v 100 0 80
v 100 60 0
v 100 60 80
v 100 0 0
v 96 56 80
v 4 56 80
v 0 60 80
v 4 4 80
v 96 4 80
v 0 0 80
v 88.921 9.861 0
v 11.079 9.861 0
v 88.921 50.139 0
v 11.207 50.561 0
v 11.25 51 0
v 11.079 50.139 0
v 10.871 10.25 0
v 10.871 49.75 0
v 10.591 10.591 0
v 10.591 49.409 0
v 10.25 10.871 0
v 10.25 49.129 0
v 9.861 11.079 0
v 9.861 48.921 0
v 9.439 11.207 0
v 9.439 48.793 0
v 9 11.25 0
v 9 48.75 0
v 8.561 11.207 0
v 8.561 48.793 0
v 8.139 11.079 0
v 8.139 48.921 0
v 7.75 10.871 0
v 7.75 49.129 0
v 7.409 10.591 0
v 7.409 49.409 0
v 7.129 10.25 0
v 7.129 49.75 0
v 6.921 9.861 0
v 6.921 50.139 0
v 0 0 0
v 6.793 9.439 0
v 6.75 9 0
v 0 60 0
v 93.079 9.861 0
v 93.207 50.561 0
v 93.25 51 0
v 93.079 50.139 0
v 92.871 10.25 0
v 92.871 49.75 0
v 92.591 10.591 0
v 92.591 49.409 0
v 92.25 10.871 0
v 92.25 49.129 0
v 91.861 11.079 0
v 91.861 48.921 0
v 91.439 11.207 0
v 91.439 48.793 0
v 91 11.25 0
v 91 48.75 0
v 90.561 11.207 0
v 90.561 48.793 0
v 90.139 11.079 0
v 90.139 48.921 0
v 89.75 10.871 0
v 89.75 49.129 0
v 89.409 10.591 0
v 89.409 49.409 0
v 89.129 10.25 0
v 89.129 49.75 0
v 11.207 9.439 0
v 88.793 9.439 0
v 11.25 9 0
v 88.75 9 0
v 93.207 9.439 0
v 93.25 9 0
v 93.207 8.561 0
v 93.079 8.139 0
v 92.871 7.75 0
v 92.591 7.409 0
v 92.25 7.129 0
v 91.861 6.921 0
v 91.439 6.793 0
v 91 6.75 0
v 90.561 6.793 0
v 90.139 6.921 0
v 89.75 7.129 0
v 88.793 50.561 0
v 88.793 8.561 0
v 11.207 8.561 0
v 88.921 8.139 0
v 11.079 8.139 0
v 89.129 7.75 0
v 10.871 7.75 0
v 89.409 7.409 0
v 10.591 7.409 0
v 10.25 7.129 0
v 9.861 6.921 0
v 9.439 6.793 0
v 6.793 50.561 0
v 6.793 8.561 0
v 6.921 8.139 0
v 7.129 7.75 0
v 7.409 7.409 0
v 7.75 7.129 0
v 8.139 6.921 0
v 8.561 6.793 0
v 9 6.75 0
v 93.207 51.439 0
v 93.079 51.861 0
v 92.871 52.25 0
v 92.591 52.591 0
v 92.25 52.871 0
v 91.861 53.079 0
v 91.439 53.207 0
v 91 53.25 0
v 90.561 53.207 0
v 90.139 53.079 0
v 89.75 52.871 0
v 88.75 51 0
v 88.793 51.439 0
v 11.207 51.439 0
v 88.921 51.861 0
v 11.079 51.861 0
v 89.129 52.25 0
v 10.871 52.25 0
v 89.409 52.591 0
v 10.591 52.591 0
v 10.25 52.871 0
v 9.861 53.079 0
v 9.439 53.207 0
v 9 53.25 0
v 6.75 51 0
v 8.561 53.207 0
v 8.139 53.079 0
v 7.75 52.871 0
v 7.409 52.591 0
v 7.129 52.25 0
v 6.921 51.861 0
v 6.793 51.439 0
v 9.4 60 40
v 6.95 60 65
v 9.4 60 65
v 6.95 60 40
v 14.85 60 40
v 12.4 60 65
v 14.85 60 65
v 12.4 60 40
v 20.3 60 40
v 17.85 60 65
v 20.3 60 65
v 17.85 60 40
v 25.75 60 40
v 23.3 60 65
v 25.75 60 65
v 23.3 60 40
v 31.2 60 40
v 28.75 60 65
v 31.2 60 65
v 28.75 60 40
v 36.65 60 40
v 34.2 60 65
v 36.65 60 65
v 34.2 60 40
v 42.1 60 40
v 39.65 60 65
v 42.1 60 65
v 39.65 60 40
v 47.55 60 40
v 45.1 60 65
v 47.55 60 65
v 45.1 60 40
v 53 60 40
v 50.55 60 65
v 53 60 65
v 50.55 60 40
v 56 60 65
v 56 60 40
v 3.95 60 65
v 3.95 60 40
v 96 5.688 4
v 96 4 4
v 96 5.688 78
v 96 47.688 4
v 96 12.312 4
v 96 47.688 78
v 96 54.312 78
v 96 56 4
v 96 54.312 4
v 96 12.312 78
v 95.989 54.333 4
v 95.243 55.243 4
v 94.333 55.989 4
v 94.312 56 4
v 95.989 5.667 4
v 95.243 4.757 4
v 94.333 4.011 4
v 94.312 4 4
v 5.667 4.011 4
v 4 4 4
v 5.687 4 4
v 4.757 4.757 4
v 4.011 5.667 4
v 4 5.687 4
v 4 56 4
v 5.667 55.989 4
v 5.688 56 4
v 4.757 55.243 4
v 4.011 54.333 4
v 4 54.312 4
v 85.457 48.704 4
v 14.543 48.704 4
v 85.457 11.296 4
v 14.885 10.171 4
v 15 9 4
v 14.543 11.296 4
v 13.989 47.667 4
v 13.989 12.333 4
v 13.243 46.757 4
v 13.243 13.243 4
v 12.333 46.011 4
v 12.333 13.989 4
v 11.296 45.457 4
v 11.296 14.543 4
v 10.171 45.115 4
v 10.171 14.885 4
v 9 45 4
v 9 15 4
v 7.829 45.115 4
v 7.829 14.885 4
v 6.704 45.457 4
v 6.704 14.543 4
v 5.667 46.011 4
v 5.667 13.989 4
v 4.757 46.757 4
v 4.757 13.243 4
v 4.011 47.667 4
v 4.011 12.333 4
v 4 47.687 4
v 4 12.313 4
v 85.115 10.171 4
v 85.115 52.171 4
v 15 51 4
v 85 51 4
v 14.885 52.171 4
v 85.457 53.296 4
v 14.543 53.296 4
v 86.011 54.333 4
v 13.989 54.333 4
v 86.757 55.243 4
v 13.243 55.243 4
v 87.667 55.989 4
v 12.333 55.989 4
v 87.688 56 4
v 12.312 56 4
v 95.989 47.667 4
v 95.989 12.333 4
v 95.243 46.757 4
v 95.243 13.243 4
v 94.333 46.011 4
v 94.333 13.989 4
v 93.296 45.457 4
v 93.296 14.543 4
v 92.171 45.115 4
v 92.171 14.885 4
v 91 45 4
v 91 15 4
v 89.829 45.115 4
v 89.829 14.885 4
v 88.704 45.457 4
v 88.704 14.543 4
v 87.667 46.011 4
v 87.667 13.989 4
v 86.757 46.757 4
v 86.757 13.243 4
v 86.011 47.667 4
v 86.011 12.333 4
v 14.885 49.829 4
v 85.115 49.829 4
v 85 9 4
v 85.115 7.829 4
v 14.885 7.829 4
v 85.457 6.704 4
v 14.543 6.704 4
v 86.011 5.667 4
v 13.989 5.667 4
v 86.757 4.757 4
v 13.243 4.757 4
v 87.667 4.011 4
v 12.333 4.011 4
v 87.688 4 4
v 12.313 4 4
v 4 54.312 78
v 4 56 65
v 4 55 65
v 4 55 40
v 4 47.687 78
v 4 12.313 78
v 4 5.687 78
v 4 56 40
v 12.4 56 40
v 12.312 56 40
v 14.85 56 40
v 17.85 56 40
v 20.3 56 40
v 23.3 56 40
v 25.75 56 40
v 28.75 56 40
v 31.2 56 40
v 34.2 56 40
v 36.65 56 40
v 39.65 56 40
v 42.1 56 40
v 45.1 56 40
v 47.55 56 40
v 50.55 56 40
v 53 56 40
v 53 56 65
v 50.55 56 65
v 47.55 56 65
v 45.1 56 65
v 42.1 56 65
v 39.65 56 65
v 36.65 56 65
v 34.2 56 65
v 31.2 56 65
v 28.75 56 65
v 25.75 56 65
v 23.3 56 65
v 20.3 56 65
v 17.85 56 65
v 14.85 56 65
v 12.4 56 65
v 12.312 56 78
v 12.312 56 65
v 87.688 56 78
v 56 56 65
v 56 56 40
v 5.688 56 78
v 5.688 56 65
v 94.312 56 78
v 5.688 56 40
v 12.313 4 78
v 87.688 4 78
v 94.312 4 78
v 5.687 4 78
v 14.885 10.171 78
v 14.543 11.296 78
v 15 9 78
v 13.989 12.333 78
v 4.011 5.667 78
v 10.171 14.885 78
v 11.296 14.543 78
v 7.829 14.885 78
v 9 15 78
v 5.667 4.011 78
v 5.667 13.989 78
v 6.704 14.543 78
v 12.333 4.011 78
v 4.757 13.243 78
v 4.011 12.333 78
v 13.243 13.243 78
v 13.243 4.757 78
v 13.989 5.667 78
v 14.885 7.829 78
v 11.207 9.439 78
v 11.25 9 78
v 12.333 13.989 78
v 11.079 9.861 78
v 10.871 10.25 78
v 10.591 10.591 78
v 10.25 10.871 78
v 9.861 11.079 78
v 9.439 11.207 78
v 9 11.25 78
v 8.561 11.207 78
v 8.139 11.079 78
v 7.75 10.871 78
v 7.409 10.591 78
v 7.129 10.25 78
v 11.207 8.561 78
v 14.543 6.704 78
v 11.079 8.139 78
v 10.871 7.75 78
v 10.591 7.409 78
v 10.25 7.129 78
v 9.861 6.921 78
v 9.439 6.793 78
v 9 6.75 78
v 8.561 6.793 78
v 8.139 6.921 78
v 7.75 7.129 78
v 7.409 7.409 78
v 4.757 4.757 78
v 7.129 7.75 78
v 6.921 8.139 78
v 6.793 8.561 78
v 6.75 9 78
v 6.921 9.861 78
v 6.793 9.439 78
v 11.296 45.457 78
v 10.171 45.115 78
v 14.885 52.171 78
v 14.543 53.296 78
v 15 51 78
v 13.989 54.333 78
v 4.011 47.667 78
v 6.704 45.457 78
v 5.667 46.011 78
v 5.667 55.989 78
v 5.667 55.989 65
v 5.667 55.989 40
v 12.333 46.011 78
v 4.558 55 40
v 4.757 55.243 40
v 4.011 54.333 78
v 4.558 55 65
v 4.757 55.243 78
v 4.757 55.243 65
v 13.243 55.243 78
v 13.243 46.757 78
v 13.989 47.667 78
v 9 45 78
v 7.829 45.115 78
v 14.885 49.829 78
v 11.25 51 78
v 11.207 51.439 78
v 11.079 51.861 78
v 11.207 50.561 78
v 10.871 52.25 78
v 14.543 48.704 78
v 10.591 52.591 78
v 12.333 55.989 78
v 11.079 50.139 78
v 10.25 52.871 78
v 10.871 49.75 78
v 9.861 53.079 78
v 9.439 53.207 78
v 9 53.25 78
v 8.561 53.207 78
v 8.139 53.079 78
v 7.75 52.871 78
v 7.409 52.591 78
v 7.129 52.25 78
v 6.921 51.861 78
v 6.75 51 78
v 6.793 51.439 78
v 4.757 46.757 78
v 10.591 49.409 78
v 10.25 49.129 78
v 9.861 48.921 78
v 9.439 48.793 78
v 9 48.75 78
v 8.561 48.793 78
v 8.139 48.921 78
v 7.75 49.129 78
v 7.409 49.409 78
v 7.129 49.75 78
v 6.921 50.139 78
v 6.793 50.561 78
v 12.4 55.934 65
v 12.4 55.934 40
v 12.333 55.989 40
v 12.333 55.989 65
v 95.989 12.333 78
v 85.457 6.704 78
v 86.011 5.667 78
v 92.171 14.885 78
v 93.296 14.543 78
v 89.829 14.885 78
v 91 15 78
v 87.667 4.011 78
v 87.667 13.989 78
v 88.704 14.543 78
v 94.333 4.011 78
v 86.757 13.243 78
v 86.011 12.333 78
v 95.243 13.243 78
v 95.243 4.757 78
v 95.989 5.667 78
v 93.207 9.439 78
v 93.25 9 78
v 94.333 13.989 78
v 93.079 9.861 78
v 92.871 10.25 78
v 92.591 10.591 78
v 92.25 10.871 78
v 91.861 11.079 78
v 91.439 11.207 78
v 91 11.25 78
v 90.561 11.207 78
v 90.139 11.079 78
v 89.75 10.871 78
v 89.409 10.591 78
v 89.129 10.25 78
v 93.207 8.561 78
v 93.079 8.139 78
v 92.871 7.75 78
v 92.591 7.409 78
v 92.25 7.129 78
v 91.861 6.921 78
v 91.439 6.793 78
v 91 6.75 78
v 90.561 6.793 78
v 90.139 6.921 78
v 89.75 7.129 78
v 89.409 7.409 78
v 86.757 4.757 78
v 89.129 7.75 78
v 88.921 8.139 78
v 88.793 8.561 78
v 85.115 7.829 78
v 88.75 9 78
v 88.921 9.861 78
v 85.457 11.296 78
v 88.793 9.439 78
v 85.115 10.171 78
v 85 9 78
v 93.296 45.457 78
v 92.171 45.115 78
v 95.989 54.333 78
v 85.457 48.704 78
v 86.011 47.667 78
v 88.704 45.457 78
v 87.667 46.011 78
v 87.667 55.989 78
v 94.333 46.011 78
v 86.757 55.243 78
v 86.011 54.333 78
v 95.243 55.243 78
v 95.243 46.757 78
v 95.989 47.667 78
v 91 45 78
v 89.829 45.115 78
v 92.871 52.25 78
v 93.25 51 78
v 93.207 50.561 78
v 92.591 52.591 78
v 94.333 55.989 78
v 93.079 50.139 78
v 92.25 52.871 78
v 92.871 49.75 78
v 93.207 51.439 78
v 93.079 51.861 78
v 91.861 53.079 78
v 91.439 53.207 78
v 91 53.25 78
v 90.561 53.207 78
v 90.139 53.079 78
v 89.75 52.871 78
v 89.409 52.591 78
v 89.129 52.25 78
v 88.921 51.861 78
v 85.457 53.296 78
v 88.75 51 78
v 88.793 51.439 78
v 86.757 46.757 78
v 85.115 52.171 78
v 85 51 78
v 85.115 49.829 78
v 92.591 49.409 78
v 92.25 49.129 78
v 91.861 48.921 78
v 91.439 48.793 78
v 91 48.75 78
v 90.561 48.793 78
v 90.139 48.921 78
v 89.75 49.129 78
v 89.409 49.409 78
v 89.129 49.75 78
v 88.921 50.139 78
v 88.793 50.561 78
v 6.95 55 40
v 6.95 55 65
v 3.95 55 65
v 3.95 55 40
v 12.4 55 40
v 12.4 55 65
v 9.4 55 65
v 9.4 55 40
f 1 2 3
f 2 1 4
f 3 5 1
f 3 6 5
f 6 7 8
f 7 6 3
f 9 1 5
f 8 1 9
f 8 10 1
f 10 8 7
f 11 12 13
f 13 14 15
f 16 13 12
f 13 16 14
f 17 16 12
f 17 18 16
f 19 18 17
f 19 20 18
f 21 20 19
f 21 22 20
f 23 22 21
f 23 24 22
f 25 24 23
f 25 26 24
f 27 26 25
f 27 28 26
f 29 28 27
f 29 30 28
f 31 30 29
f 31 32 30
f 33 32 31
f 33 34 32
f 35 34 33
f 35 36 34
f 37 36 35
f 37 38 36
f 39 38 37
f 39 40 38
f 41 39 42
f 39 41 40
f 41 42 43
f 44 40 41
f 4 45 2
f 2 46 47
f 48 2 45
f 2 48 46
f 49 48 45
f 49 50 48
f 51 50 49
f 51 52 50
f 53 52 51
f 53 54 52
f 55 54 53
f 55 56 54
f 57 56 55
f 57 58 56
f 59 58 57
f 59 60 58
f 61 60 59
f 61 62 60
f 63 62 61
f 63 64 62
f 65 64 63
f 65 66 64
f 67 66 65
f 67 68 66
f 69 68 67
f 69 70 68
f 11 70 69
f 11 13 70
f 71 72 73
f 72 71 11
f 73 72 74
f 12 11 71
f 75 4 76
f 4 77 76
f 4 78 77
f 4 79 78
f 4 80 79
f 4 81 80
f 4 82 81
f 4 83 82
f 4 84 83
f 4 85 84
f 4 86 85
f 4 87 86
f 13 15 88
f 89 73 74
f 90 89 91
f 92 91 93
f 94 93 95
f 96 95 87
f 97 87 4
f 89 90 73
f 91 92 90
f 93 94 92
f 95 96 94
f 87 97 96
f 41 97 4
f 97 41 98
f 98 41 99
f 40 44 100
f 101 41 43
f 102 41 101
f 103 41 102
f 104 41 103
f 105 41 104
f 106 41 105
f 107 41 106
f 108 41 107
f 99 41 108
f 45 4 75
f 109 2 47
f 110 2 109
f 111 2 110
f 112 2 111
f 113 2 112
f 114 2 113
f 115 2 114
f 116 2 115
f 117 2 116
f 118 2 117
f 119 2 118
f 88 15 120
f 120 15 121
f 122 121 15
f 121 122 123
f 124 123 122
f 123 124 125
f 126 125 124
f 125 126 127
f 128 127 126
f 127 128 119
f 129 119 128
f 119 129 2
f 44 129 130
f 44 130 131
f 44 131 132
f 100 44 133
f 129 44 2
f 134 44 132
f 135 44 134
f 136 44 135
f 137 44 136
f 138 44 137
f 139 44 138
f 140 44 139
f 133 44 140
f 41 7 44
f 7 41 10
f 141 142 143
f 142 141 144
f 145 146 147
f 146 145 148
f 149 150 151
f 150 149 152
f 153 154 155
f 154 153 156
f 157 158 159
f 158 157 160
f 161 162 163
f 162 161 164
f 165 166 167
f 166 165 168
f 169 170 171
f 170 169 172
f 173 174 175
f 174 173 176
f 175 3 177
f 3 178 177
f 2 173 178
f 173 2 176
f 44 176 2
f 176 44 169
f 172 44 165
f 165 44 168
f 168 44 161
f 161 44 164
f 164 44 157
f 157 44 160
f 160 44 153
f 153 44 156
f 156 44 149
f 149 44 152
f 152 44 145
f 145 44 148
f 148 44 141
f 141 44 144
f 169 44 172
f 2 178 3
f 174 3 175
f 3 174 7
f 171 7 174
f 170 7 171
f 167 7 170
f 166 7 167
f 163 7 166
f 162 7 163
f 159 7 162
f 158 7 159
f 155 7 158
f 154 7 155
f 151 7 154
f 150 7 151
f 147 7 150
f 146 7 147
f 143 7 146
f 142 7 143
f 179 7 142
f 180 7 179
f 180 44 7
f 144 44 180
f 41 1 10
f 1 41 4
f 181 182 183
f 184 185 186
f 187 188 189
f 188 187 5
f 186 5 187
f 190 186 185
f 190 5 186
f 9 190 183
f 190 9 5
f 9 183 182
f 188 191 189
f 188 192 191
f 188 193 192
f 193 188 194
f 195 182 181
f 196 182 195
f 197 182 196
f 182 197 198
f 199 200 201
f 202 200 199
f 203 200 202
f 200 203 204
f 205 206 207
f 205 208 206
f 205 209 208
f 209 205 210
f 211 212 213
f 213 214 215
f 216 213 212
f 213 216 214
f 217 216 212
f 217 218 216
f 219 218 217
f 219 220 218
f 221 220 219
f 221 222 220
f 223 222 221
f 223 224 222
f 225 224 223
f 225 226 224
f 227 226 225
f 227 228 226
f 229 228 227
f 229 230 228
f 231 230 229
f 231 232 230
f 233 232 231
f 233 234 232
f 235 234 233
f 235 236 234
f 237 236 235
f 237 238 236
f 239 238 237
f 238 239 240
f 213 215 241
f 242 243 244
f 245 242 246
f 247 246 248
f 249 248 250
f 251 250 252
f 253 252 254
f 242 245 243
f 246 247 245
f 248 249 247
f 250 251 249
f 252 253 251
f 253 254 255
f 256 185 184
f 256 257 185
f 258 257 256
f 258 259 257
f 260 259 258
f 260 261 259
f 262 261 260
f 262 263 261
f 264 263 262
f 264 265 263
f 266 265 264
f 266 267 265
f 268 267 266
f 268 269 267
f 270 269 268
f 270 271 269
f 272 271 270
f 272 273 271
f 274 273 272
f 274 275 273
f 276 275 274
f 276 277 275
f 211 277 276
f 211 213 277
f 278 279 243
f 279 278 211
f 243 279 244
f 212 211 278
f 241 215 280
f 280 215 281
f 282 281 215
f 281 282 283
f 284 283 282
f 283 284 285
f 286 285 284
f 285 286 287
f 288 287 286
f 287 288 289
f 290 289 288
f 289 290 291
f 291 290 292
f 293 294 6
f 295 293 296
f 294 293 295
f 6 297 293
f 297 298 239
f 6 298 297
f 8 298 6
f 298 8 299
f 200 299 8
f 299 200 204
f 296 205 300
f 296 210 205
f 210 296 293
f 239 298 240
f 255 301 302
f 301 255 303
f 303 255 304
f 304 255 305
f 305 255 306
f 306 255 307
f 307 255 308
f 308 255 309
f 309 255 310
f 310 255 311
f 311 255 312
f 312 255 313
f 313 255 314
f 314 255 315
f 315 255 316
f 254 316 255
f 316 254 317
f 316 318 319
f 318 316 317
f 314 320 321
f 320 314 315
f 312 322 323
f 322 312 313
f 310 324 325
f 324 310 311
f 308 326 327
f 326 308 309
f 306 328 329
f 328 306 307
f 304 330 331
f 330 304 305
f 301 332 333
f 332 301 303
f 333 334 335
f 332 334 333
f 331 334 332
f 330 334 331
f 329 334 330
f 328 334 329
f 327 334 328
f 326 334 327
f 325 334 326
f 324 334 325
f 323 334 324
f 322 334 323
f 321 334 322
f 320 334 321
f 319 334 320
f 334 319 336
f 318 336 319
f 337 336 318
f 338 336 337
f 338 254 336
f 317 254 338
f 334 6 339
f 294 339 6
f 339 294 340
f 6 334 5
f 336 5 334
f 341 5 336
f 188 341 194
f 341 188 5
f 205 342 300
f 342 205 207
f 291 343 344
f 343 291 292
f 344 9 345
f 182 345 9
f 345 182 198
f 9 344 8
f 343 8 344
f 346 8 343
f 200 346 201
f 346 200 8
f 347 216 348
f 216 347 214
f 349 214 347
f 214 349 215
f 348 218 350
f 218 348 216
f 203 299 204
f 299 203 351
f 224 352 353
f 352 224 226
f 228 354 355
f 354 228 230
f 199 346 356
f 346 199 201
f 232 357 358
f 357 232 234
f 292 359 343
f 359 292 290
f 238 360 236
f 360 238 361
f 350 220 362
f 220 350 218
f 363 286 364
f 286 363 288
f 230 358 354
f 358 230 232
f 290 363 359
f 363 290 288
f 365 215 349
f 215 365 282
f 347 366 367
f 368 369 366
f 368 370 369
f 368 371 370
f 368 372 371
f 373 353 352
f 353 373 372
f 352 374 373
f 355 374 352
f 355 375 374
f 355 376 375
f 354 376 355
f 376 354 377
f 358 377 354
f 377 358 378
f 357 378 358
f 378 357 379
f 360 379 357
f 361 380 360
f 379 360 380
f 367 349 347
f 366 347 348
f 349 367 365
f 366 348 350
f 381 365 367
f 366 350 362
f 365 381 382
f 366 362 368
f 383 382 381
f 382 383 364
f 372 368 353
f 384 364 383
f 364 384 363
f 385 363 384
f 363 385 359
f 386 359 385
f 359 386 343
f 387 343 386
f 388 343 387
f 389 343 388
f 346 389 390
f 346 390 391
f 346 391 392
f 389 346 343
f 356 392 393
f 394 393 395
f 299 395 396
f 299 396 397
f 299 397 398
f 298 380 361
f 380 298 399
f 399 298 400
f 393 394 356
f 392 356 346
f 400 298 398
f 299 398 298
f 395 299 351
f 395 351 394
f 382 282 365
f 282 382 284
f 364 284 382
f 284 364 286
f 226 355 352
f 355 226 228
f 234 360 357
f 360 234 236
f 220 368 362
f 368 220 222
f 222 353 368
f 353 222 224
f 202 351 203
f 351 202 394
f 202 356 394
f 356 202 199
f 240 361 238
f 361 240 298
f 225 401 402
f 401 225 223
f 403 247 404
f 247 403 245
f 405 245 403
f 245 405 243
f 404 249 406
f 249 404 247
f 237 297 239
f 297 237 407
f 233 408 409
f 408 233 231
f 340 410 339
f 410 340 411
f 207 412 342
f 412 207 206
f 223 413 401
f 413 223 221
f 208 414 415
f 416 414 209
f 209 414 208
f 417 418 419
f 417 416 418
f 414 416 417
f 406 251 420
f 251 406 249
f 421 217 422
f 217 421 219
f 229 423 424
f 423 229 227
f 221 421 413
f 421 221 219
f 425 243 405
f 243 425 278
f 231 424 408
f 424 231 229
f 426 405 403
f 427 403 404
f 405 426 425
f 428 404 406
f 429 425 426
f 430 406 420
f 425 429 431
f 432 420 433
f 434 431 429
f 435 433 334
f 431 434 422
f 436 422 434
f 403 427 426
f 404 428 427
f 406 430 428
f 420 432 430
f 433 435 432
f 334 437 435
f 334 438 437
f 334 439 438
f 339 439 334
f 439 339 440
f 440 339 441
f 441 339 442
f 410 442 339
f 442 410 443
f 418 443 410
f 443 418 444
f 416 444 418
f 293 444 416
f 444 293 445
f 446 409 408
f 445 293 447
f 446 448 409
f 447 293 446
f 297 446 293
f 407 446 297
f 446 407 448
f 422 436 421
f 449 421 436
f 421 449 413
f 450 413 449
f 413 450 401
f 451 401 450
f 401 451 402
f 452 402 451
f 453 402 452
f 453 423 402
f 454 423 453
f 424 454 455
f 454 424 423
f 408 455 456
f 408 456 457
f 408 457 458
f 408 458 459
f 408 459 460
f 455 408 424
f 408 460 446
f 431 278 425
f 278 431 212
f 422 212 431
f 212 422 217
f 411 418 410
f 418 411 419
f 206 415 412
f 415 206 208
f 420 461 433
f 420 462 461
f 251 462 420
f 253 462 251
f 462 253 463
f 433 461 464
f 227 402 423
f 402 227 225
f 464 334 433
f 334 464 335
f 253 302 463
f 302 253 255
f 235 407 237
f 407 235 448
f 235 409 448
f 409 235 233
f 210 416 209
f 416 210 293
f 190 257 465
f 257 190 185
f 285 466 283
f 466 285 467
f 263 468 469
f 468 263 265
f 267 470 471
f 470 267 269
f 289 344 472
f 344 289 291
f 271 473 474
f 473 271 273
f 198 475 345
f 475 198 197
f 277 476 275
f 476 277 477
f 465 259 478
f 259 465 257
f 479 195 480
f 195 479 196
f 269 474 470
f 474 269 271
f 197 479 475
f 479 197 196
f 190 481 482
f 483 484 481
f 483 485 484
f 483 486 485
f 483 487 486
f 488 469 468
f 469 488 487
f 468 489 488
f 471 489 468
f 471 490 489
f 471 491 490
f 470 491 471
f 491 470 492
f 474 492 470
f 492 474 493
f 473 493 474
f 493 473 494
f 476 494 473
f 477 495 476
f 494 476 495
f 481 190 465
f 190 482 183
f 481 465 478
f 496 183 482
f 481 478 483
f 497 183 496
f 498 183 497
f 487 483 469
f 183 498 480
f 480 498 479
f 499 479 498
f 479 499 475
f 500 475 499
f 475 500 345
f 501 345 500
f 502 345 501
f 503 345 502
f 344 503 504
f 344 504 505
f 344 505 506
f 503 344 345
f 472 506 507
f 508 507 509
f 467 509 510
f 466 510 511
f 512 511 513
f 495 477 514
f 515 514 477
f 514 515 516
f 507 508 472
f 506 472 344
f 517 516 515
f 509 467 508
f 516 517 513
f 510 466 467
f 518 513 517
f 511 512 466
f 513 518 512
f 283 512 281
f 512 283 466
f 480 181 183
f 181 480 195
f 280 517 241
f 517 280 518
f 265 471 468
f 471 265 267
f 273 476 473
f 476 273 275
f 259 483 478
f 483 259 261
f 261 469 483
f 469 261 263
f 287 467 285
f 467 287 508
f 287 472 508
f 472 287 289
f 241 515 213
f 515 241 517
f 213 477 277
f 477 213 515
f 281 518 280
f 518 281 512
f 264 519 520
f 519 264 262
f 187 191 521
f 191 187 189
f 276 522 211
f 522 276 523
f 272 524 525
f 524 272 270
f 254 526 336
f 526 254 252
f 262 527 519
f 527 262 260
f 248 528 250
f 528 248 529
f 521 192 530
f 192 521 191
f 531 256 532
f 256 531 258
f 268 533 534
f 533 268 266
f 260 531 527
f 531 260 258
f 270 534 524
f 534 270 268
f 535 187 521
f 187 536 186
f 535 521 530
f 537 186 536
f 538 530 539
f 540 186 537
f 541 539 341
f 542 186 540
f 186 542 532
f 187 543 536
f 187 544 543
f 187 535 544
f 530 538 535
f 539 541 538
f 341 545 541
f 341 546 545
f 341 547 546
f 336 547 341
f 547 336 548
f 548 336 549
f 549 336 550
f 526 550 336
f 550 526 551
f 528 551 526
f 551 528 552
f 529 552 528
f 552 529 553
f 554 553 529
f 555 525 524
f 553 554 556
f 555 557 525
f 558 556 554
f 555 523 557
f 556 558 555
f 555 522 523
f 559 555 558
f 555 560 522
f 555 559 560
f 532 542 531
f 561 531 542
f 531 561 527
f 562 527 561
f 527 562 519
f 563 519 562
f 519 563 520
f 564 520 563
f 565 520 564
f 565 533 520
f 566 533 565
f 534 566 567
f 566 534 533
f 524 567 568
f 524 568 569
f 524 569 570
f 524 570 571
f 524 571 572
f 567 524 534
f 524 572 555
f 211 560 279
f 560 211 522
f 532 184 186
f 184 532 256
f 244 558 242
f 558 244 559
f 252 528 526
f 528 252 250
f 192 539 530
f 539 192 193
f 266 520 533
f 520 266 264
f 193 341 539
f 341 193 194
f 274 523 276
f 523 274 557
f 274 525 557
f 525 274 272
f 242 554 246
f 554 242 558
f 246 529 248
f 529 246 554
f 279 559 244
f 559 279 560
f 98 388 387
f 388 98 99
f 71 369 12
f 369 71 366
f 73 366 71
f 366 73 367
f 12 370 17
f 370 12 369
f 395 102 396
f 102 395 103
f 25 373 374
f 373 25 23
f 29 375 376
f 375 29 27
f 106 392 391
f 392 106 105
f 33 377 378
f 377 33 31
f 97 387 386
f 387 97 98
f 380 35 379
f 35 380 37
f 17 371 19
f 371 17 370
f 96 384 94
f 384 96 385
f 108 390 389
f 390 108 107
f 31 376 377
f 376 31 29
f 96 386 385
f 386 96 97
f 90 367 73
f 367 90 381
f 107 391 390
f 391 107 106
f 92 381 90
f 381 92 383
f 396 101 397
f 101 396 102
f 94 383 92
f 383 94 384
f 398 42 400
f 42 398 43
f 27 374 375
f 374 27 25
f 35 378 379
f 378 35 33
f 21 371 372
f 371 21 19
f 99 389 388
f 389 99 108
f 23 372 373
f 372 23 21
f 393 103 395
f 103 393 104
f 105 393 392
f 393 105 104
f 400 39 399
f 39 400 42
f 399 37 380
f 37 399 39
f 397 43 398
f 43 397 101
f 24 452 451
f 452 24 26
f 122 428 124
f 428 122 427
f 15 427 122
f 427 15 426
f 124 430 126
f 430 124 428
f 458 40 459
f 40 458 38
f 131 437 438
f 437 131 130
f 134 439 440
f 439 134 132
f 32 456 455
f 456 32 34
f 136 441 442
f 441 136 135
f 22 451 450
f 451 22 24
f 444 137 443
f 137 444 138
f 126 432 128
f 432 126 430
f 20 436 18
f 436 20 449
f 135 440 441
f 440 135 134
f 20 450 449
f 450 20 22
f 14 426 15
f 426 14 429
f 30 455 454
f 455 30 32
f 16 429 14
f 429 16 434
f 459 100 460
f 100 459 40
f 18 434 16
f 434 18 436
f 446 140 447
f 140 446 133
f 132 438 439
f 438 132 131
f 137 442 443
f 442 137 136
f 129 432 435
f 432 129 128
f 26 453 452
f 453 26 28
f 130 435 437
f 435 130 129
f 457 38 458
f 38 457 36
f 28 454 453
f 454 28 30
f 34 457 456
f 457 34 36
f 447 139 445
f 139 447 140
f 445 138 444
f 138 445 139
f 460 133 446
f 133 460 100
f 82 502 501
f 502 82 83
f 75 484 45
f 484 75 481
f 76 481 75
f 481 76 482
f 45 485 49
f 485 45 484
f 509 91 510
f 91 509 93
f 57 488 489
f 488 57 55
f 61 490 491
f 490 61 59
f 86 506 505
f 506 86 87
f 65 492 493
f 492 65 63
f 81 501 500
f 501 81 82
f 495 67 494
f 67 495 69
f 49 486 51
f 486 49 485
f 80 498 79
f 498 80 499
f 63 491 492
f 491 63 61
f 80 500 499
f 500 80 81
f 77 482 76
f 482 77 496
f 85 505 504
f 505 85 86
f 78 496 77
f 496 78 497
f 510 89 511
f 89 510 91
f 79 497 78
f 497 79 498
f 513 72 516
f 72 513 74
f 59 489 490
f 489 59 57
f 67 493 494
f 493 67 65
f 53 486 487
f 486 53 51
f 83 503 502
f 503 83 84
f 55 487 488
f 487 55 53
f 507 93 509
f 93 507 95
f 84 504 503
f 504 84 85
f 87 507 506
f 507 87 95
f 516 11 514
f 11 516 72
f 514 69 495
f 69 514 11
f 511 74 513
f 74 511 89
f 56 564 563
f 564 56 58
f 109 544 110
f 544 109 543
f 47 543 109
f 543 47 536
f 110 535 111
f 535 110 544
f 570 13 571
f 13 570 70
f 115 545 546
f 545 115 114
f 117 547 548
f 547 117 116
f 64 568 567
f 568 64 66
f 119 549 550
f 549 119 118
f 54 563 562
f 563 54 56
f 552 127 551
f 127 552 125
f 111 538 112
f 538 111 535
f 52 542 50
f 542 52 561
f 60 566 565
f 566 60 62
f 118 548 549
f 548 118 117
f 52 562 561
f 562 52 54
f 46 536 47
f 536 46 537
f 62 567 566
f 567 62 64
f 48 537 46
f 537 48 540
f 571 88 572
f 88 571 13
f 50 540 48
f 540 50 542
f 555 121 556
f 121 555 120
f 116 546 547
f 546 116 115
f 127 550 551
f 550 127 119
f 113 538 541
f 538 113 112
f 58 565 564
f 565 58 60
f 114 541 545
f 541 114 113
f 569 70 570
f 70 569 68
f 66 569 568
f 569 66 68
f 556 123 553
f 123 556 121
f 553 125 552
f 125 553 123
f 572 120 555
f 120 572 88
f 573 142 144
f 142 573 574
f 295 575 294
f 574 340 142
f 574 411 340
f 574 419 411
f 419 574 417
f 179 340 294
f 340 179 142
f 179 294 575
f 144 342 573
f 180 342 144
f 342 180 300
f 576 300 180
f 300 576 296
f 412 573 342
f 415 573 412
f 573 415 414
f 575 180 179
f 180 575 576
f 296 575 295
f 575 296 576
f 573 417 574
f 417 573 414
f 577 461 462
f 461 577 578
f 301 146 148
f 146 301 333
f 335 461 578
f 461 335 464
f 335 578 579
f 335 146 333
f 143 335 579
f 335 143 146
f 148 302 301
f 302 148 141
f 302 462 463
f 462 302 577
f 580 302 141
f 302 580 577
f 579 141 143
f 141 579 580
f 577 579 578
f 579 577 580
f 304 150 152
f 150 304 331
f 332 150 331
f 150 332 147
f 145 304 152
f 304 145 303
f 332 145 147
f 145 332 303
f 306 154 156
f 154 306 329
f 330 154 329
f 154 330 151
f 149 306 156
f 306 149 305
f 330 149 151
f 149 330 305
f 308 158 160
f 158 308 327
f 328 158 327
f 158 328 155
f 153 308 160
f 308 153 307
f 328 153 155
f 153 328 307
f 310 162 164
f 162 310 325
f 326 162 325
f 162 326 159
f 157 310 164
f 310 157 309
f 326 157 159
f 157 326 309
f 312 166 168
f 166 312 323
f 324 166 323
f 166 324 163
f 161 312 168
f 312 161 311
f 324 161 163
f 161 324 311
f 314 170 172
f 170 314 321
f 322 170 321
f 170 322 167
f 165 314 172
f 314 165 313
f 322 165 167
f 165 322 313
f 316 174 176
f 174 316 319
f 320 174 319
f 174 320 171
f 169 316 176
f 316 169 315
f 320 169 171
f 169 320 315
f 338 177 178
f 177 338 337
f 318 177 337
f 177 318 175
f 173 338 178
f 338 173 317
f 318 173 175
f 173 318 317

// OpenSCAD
$fn = 32;

// ----------------------------------------------------------------------
// Enclosure body: 100 x 60 x 80 mm, wall 4 mm
// ----------------------------------------------------------------------

// --- parameters (mm) ---
length = 100;             // outside length, X
width = 60;               // outside width, Y
height = 80;              // outside height, Z
wall = 4;                 // side wall thickness
floor_t = 4;              // floor thickness
boss_d = 12;              // corner boss diameter
boss_h = 74;              // corner boss height above the floor
boss_hole_d = 4.5;        // lid screw clearance in the boss
boss_lip = 9;             // boss centre inset from the corner
vent_slots = 10;          // vent slots in the long wall
vent_w = 3;               // vent slot width
vent_h = 25;              // vent slot height
vent_pitch = 5.45;        // vent slot pitch
vent_z = 40;              // vent slot sill height

module shell() {
  difference() {
    cube([length, width, height]);
    /* hollow, open at the top */
    translate([wall, wall, floor_t])
      cube([length - 2 * wall, width - 2 * wall, height]);
  }
}

module bosses() {
  /* corner bosses, sunk 1 mm into the floor */
  for (sx = [0, 1]) for (sy = [0, 1])
    translate([sx * (length - 2 * boss_lip) + boss_lip, sy * (width - 2 * boss_lip) + boss_lip, floor_t - 1])
      cylinder(h = boss_h + 1, d = boss_d);
}

difference() {
  union() {
    shell();
    bosses();
  }
  /* boss screw holes */
  for (sx = [0, 1]) for (sy = [0, 1])
    translate([sx * (length - 2 * boss_lip) + boss_lip, sy * (width - 2 * boss_lip) + boss_lip, -1]) cylinder(h = floor_t + boss_h + 2, d = boss_hole_d);
  /* vent grille in the +Y wall */
  for (i = [0 : vent_slots - 1]) translate([vent_pitch * (i + 1) - vent_w / 2, width - wall - 1, vent_z]) cube([vent_w, wall + 2, vent_h]);
}
